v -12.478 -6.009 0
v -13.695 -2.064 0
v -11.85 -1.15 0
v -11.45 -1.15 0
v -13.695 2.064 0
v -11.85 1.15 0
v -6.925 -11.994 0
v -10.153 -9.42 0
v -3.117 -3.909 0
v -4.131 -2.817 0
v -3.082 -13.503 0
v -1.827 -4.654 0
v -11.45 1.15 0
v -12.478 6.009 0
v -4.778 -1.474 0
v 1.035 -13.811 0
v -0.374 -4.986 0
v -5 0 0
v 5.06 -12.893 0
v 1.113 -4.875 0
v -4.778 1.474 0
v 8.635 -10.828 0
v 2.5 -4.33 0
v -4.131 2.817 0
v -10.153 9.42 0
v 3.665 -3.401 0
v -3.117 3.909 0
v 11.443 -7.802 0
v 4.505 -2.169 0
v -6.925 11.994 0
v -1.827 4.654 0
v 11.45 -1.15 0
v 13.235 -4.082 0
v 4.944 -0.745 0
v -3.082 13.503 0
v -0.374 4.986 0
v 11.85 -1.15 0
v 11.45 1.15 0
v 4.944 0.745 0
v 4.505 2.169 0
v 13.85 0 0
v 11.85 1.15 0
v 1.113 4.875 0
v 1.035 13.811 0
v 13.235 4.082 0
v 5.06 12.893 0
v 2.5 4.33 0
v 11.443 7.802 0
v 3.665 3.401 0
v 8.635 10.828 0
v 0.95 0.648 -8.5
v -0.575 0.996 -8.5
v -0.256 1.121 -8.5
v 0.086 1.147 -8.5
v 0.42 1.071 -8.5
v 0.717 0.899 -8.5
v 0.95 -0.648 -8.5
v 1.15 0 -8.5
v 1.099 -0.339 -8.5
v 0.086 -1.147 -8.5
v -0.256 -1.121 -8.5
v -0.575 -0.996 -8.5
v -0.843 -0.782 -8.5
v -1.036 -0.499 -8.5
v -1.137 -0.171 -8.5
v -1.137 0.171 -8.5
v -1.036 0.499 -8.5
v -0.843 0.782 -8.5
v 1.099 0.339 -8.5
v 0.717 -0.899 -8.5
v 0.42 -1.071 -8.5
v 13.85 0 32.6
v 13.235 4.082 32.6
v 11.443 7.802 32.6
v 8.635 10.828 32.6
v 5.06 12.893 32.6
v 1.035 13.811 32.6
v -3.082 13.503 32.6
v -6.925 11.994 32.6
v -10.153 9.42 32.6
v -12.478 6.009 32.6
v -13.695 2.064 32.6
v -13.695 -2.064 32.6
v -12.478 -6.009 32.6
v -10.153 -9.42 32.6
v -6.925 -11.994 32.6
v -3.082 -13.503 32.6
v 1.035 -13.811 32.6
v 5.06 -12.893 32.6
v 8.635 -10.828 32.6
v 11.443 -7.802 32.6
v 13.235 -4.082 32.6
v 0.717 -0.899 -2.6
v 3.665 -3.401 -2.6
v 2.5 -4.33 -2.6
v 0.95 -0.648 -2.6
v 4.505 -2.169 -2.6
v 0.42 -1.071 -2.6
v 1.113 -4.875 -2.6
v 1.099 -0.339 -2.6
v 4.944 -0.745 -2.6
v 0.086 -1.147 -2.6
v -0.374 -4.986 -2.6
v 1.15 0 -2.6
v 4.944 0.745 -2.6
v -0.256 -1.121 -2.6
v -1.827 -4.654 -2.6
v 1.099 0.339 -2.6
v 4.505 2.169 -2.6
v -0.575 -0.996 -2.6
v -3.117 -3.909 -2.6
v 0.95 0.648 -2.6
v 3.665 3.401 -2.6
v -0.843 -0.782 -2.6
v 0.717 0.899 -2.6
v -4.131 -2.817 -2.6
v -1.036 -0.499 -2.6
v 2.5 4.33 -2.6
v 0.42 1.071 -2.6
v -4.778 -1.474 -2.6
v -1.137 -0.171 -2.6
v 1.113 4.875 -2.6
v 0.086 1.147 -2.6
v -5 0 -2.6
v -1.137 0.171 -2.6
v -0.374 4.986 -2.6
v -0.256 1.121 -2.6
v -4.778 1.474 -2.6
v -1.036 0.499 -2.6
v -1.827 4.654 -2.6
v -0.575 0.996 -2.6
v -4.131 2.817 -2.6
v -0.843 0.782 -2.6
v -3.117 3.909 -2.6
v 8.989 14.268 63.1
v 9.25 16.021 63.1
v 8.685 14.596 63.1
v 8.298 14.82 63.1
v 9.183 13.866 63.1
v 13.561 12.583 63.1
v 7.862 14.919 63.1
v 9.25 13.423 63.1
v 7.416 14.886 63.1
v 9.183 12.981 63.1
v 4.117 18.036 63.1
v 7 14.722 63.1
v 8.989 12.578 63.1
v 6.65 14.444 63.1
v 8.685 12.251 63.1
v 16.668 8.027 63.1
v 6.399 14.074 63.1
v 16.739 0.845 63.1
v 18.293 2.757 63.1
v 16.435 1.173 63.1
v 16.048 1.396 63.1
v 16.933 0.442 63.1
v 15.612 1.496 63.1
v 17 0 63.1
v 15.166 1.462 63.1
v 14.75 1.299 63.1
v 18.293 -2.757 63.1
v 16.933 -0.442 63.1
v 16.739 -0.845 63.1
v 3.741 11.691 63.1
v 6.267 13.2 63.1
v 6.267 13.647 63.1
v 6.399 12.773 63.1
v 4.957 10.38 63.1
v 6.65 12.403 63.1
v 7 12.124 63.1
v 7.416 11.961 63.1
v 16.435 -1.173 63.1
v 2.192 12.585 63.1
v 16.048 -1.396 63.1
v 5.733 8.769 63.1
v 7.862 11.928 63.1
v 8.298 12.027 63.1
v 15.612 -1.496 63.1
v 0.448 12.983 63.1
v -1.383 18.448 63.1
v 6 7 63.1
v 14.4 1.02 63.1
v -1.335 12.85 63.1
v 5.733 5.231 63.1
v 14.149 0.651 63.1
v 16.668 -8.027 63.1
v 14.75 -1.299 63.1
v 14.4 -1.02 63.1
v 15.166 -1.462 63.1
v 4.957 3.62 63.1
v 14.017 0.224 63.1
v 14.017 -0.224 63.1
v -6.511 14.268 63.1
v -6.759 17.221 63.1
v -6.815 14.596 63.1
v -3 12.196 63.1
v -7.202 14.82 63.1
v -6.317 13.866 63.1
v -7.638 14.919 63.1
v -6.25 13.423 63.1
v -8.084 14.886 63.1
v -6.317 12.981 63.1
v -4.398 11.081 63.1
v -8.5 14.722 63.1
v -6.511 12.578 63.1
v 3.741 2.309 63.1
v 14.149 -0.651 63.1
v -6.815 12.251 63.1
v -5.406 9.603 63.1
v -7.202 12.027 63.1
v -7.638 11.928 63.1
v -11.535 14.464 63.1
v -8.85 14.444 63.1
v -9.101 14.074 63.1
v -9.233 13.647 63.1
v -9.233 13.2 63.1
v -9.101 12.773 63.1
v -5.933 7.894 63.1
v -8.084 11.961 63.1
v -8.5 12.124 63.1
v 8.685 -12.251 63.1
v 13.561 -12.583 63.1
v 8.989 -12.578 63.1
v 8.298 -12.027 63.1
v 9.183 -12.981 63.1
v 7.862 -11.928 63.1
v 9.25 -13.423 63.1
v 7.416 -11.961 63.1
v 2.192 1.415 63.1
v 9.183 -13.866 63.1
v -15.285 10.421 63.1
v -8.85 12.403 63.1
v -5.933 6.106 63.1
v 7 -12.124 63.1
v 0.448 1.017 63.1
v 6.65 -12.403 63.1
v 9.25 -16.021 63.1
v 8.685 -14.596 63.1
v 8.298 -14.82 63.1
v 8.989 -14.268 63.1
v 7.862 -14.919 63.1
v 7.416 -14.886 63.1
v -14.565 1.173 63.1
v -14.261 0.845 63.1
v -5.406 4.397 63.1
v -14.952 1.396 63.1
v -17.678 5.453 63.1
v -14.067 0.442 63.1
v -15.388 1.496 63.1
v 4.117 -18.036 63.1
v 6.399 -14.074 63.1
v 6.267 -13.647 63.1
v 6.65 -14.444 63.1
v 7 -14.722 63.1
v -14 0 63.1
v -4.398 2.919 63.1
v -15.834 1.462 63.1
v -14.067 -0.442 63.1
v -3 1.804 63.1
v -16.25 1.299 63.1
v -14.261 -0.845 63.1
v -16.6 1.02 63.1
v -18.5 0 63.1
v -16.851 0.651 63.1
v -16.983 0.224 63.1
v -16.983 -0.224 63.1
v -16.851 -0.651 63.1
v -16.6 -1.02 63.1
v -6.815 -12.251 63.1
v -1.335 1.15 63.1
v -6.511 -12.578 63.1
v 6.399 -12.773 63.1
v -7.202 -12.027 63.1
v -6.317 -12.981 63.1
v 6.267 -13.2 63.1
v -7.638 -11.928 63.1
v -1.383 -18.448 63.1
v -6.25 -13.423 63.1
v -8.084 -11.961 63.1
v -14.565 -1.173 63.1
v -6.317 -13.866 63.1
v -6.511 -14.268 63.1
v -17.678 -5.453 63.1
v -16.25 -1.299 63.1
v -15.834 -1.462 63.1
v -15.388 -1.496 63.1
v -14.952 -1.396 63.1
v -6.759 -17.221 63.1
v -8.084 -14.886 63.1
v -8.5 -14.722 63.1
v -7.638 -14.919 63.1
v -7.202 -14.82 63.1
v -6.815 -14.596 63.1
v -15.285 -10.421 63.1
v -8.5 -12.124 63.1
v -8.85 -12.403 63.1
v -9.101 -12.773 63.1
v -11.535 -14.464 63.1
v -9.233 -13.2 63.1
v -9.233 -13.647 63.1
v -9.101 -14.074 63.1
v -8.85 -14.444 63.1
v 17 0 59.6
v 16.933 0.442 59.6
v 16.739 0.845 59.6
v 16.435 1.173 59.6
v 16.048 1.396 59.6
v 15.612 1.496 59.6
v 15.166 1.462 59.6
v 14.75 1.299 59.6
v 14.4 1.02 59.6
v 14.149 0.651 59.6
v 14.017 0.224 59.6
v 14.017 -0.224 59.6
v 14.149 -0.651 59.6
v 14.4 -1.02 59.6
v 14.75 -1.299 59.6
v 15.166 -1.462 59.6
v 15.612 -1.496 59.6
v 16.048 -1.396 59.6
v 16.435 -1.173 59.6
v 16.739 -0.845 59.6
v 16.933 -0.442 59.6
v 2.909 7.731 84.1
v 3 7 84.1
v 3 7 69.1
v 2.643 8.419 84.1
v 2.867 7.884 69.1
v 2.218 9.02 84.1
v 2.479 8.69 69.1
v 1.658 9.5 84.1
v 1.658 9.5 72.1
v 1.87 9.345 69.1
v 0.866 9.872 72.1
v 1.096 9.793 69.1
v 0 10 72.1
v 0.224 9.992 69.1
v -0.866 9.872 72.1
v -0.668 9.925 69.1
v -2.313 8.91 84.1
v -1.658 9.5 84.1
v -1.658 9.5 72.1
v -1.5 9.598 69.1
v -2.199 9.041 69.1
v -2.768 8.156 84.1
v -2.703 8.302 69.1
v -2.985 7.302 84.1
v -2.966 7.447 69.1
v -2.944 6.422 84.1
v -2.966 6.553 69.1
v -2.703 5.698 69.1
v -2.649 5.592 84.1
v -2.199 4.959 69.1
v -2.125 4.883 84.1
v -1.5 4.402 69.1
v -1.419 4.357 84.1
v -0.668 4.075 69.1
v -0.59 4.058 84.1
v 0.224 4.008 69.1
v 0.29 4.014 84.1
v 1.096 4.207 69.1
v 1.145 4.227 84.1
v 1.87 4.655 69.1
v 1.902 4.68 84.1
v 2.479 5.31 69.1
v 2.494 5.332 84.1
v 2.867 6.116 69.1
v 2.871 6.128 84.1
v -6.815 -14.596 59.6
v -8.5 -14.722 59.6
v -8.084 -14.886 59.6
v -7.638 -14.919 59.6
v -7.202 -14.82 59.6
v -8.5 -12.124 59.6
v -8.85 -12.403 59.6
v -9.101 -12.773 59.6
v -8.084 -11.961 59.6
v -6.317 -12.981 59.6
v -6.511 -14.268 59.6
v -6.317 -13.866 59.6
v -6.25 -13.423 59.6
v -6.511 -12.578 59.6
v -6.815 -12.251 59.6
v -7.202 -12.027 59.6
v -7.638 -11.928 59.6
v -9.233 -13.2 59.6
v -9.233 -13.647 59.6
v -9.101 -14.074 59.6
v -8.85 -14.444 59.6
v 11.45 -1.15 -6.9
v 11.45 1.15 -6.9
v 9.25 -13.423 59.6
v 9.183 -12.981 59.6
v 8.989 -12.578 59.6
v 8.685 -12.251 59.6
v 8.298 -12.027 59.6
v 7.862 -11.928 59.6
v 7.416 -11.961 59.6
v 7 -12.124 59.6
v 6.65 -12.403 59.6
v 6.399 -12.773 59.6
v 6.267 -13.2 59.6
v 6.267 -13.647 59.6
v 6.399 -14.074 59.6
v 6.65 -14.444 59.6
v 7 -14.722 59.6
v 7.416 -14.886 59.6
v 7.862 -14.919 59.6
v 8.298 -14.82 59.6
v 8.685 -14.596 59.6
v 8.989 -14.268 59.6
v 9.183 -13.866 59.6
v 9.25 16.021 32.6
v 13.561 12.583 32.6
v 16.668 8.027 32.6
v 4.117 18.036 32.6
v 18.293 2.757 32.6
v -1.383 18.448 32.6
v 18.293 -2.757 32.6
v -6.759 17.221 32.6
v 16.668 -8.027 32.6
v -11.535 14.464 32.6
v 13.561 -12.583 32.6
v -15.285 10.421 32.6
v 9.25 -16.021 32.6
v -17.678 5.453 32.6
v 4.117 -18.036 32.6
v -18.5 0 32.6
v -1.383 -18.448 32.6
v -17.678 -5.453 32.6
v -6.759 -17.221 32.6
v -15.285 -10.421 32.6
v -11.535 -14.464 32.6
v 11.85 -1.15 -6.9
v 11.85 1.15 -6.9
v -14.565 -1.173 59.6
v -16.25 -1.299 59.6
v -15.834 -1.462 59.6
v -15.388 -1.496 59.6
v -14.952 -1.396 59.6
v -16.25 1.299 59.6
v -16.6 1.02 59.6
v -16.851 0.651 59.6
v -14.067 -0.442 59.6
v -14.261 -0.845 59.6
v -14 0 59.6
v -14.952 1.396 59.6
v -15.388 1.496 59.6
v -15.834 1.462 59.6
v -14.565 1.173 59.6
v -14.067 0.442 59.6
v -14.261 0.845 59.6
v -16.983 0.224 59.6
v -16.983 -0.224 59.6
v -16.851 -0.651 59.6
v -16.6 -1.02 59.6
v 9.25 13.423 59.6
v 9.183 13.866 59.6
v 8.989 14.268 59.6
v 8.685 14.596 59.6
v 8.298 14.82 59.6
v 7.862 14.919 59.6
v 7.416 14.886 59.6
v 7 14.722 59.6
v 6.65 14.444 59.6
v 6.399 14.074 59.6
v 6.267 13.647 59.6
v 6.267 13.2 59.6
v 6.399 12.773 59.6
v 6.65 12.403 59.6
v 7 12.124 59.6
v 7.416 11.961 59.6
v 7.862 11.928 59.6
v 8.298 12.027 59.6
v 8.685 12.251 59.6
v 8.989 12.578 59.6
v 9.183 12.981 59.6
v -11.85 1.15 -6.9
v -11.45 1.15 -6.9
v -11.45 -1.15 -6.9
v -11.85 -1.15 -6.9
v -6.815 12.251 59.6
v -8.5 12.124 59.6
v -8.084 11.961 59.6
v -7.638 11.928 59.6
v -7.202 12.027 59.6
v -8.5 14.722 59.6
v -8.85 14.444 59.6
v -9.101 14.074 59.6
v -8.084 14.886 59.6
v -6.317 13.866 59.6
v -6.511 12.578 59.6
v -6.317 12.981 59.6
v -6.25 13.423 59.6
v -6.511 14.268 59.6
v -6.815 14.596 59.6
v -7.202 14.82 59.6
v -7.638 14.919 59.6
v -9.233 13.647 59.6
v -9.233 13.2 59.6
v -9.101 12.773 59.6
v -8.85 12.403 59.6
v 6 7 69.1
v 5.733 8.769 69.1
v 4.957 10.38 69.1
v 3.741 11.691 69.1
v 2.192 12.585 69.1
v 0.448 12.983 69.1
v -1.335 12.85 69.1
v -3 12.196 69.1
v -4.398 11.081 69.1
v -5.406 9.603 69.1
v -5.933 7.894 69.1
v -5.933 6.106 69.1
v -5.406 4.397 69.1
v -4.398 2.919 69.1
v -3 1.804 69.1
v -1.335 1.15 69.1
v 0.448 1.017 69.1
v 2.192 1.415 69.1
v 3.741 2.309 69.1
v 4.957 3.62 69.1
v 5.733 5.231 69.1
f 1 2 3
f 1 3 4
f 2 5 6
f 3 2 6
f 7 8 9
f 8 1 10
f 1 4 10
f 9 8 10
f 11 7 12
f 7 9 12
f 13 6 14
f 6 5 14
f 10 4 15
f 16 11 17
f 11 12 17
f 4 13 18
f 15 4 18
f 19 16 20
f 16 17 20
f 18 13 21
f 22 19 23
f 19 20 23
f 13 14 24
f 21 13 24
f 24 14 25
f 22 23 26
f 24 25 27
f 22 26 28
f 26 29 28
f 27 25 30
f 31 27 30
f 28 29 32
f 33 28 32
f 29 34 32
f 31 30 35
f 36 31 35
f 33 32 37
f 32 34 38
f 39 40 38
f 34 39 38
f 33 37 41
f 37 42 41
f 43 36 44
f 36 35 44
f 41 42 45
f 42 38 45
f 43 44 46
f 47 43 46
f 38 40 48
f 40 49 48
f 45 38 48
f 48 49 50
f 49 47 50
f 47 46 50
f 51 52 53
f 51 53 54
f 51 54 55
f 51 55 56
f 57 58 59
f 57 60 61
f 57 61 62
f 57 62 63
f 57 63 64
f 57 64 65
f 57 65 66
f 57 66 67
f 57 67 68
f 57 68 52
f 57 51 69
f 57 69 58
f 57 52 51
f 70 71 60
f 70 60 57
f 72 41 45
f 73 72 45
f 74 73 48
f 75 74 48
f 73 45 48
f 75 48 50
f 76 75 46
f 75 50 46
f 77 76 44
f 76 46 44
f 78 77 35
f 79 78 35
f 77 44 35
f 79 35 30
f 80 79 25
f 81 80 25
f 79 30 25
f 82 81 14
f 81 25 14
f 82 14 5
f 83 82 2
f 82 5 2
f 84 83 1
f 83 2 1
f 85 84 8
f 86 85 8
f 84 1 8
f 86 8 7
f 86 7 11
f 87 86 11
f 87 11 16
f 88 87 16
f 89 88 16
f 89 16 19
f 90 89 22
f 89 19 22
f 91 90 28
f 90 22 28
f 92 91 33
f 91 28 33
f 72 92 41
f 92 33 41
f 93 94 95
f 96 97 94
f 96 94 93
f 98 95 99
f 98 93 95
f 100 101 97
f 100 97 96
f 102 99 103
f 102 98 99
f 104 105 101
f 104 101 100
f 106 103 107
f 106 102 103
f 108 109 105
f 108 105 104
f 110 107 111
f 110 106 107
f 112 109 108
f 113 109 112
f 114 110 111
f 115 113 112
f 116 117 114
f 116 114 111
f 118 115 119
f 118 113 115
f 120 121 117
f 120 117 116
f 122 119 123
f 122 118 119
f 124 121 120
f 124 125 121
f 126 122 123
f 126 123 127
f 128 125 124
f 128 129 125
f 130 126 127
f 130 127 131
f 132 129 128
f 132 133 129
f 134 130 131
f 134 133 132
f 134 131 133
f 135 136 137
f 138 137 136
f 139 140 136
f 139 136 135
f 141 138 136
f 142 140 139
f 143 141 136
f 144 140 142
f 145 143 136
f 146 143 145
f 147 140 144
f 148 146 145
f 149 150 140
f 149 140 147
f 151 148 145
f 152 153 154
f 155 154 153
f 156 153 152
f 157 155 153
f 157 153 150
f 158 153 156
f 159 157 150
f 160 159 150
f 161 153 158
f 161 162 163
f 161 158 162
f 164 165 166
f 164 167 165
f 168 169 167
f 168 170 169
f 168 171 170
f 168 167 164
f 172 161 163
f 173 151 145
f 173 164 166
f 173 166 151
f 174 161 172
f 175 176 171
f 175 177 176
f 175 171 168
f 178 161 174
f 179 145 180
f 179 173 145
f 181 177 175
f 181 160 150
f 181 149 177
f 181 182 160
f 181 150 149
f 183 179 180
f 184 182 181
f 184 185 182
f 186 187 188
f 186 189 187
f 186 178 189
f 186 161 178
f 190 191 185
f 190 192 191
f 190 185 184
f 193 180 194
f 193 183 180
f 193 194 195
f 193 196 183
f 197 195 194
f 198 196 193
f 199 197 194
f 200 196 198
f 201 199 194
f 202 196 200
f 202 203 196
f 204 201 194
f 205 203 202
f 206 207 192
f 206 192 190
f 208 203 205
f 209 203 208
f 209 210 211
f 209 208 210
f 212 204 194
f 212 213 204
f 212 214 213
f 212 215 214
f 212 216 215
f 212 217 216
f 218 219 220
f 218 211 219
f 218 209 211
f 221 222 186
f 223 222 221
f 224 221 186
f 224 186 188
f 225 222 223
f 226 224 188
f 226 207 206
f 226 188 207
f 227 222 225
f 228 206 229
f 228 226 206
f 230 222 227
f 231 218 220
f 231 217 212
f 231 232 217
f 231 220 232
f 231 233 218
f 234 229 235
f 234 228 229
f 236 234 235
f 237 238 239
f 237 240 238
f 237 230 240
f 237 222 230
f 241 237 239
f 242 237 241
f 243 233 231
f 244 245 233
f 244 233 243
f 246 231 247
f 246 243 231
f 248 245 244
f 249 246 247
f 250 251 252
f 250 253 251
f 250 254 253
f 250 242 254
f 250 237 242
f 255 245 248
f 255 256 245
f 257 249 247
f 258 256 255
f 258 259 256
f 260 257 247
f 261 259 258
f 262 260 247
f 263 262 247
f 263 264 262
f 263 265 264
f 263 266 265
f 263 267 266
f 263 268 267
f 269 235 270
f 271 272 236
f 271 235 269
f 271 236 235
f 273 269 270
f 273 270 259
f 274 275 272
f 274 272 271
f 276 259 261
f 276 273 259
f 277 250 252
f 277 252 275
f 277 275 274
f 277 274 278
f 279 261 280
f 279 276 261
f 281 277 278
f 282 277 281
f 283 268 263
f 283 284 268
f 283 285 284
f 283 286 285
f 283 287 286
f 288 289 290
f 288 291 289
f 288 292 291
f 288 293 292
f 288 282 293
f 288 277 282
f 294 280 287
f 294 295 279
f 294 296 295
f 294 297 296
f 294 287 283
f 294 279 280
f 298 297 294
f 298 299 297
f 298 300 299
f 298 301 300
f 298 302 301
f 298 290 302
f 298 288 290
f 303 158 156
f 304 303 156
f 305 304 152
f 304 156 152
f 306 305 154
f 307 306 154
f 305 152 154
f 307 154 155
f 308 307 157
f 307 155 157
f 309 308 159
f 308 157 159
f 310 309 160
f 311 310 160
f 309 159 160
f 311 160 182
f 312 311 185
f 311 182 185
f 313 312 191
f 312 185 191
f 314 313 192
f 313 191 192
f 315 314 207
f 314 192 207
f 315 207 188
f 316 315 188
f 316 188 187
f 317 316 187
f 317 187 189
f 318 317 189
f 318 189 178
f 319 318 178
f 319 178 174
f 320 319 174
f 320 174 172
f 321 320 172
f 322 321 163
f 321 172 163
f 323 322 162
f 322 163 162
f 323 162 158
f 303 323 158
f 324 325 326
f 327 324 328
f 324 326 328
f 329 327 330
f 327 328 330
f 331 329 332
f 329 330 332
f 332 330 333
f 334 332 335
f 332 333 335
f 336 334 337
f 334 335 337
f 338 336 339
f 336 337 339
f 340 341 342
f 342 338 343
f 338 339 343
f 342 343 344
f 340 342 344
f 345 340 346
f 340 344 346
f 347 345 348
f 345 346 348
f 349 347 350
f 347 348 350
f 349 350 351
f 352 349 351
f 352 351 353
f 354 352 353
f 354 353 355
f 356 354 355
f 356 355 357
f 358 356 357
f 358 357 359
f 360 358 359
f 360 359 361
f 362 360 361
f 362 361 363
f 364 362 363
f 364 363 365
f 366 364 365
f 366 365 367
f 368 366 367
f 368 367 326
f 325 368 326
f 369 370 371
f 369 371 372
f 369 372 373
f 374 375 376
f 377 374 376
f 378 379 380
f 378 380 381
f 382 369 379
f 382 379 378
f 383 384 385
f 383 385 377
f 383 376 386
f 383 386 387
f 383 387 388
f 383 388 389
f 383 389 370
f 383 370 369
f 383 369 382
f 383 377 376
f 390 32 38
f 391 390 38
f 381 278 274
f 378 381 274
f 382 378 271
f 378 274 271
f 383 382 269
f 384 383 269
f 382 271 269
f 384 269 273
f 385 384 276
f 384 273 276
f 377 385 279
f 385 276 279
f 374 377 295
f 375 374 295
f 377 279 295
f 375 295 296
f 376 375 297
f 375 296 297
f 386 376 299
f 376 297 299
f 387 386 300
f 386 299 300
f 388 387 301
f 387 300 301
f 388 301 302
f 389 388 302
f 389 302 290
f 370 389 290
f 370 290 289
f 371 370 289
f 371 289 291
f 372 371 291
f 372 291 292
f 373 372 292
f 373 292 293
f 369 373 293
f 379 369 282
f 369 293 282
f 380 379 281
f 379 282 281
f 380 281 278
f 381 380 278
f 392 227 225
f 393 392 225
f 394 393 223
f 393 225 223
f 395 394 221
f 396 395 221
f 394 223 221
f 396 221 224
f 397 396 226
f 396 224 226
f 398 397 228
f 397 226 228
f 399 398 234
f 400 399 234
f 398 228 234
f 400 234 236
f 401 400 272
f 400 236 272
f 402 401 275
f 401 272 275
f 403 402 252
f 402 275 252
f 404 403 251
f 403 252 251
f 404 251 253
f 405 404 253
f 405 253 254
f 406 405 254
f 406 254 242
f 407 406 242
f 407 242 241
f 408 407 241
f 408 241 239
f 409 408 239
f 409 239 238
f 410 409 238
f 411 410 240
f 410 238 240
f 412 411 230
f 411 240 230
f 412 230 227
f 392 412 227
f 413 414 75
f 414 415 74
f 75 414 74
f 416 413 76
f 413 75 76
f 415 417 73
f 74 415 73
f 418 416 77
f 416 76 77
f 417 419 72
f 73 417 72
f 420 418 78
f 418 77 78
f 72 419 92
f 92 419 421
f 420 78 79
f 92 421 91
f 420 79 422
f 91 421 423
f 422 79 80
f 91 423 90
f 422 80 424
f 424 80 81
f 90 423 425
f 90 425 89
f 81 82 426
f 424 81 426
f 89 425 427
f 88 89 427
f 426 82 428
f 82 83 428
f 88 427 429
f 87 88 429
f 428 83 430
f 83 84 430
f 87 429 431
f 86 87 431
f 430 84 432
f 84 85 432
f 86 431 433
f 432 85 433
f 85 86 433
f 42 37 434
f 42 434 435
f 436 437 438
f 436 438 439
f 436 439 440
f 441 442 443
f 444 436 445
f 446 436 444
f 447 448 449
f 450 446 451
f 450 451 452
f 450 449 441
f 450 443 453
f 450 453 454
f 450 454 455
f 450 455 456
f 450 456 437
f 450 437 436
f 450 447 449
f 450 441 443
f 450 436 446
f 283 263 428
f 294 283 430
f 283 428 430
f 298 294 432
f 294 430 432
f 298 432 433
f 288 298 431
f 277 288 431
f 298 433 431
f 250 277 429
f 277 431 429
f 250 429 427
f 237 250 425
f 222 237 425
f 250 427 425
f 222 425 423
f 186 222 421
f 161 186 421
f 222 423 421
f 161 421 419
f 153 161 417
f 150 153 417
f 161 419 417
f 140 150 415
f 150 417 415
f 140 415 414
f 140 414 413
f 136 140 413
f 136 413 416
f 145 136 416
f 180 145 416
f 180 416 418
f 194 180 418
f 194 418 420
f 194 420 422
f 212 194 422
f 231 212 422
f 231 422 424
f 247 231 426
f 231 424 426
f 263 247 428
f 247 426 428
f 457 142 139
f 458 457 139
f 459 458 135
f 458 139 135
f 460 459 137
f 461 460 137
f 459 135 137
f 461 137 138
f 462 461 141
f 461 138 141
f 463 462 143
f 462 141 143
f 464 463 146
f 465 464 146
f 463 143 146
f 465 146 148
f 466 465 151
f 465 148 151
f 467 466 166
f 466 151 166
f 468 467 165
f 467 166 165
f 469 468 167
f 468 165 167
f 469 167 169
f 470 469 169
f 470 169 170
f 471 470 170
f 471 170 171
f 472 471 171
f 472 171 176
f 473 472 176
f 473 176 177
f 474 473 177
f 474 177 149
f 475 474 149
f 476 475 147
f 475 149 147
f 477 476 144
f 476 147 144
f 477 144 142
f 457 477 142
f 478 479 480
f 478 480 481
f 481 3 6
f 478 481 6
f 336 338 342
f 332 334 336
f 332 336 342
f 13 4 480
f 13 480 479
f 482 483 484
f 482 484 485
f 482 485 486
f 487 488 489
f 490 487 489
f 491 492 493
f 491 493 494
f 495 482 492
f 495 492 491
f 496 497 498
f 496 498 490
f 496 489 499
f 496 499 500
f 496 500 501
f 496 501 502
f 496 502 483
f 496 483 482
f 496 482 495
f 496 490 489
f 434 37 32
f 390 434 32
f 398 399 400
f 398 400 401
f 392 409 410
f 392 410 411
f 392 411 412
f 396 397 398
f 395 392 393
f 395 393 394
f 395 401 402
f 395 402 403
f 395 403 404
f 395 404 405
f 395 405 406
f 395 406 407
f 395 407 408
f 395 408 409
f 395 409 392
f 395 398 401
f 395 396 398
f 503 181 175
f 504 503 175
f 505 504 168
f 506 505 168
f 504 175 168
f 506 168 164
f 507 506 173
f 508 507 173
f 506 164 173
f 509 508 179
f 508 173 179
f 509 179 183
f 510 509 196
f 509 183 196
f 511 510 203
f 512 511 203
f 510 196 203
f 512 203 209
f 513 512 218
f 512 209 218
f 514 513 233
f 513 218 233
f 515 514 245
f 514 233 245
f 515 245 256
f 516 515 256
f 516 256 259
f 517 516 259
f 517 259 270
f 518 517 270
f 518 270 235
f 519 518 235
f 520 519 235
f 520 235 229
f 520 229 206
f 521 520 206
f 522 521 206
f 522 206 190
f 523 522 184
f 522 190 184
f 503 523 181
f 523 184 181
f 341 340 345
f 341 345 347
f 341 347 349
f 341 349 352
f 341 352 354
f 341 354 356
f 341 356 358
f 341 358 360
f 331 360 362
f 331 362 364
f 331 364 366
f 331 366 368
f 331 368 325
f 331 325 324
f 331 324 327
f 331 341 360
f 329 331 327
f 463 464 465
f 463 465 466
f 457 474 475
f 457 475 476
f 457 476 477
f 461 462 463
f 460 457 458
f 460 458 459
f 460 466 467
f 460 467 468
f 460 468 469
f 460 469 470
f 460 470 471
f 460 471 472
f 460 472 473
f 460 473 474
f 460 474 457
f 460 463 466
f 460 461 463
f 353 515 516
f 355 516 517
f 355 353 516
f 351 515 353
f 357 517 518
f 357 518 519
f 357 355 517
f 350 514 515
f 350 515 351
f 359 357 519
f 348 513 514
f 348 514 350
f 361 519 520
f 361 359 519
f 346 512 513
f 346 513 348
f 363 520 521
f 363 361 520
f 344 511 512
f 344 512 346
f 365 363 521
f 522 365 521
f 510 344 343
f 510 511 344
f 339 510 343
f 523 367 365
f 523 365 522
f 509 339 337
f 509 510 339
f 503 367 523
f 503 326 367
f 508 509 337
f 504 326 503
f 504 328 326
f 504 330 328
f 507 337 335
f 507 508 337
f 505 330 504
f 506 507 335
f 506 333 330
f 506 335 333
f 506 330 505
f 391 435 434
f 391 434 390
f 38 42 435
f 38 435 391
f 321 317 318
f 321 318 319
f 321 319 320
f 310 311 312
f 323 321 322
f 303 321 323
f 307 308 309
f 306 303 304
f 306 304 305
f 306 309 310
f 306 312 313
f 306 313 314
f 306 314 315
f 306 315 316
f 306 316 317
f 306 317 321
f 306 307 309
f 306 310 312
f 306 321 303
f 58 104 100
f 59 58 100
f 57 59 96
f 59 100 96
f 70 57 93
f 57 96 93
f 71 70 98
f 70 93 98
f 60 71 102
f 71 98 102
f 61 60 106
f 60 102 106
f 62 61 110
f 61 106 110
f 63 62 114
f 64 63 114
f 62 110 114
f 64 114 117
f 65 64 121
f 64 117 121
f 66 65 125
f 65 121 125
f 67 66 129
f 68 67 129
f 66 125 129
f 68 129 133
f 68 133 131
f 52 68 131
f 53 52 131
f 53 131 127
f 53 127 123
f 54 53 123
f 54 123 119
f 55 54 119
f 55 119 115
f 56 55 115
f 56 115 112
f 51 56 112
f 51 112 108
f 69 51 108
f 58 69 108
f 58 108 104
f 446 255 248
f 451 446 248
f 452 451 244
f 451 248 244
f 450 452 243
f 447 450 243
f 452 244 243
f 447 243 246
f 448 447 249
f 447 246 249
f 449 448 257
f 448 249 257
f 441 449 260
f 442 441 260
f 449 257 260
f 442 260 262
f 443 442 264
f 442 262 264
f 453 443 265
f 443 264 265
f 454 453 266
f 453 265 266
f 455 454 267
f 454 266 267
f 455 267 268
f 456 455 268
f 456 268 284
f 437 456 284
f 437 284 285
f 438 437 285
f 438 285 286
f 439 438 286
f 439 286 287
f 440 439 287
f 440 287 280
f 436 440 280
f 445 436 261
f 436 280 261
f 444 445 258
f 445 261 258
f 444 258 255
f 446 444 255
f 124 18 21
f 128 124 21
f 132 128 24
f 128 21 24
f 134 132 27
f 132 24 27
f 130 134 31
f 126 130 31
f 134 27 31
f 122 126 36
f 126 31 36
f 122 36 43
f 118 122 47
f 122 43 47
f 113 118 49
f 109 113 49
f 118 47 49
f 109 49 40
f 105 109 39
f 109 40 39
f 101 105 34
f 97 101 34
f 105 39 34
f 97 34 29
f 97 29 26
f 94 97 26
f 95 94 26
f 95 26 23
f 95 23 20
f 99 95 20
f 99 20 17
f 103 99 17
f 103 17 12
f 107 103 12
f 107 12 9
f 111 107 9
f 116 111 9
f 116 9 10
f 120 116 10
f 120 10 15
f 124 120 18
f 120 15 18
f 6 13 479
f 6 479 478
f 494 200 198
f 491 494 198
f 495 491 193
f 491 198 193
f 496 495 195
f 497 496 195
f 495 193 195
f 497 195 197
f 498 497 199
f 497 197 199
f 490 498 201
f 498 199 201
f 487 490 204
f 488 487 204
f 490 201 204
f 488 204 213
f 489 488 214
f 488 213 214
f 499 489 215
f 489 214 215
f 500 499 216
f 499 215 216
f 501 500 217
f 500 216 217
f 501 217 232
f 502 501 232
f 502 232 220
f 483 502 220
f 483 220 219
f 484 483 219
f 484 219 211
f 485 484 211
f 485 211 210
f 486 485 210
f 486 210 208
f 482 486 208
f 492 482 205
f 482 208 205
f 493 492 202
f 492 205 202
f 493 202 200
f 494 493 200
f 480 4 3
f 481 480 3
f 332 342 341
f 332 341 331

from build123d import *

# Parameters (mm, degrees)
SKETCH_1_R          = 13.85
EXTRUDE_1_DEPTH     = 32.6
SKETCH_2_R          = 18.5
EXTRUDE_2_DEPTH     = 30.5
SKETCH_3_R          = 6
EXTRUDE_3_DEPTH     = 6
SKETCH_4_R          = 3
EXTRUDE_4_DEPTH     = 15
CUT_EXTRUDE_START   = -12
CUT_EXTRUDE_1_DEPTH = 12
SKETCH_6_R          = 1.5
CUT_EXTRUDE_2_DEPTH = 3.5
SKETCH_7_R          = 5
EXTRUDE_5_DEPTH     = 2.6
EXTRUDE_START       = -2.6
SKETCH_8_R          = 1.15
EXTRUDE_6_DEPTH     = 8.5
SKETCH_9_W          = 0.4
SKETCH_9_H          = 2.3
EXTRUDE_7_DEPTH     = 6.9


with BuildPart() as part:
    # ｽｹｯﾁ1 → ﾎﾞｽ - 押し出し1 (new body)
    with BuildSketch(Plane.XY):
        Circle(SKETCH_1_R)
    extrude(amount=EXTRUDE_1_DEPTH)

    # ｽｹｯﾁ2 → ﾎﾞｽ - 押し出し2 (add)
    with BuildSketch(Plane.XY.offset(32.6)):
        with Locations(Location((0, 0, 0), (0, 0, 180))):
            Circle(SKETCH_2_R)
    extrude(amount=EXTRUDE_2_DEPTH)

    # ｽｹｯﾁ3 → ﾎﾞｽ - 押し出し3 (add)
    with BuildSketch(Plane.XY.offset(63.1)):
        with Locations((0, 7)):
            Circle(SKETCH_3_R)
    extrude(amount=EXTRUDE_3_DEPTH)

    # ｽｹｯﾁ4 → ﾎﾞｽ - 押し出し4 (add)
    with BuildSketch(Plane.XY.offset(69.1)):
        with Locations((0, 7)):
            Circle(SKETCH_4_R)
    extrude(amount=EXTRUDE_4_DEPTH)

    # ｽｹｯﾁ5 → ｶｯﾄ - 押し出し1 (cut)
    with BuildSketch(Plane.XY.offset(84.1).offset(CUT_EXTRUDE_START)):
        with BuildLine():
            Line((-1.658312395, 9.5), (1.658312395, 9.5))
            ThreePointArc((1.658312395, 9.5), (0, 10), (-1.658312395, 9.5))
        make_face()
    extrude(amount=CUT_EXTRUDE_1_DEPTH, mode=Mode.SUBTRACT)

    # ｽｹｯﾁ6 → ｶｯﾄ - 押し出し2 (cut)
    with BuildSketch(Plane.XY.offset(63.1)):
        with Locations((-15.5, 0)):
            Circle(SKETCH_6_R)
        with Locations((-7.75, 13.423393759)):
            Circle(SKETCH_6_R)
        with Locations((7.75, 13.423393759)):
            Circle(SKETCH_6_R)
        with Locations((15.5, 0)):
            Circle(SKETCH_6_R)
        with Locations((7.75, -13.423393759)):
            Circle(SKETCH_6_R)
        with Locations((-7.75, -13.423393759)):
            Circle(SKETCH_6_R)
    extrude(amount=-CUT_EXTRUDE_2_DEPTH, mode=Mode.SUBTRACT)

    # ｽｹｯﾁ7 → ﾎﾞｽ - 押し出し5 (add)
    with BuildSketch(Plane(origin=(0, 0, 0), x_dir=(-1, 0, 0), z_dir=(0, 0, -1))):
        Circle(SKETCH_7_R)
    extrude(amount=EXTRUDE_5_DEPTH)

    # ｽｹｯﾁ8 → ﾎﾞｽ - 押し出し6 (add)
    with BuildSketch(Plane(origin=(0, 0, -2.6), x_dir=(-1, 0, 0), z_dir=(0, 0, -1)).offset(EXTRUDE_START)):
        with Locations(Location((0, 0, 0), (0, 0, 180))):
            Circle(SKETCH_8_R)
    extrude(amount=EXTRUDE_6_DEPTH)

    # ｽｹｯﾁ9 → ﾎﾞｽ - 押し出し7 (add)
    with BuildSketch(Plane(origin=(0, 0, 0), x_dir=(-1, 0, 0), z_dir=(0, 0, -1))):
        with Locations((11.65, 0)):
            Rectangle(SKETCH_9_W, SKETCH_9_H)
        with Locations((-11.65, 0)):
            Rectangle(SKETCH_9_W, SKETCH_9_H)
    extrude(amount=EXTRUDE_7_DEPTH)


solid = part.part
